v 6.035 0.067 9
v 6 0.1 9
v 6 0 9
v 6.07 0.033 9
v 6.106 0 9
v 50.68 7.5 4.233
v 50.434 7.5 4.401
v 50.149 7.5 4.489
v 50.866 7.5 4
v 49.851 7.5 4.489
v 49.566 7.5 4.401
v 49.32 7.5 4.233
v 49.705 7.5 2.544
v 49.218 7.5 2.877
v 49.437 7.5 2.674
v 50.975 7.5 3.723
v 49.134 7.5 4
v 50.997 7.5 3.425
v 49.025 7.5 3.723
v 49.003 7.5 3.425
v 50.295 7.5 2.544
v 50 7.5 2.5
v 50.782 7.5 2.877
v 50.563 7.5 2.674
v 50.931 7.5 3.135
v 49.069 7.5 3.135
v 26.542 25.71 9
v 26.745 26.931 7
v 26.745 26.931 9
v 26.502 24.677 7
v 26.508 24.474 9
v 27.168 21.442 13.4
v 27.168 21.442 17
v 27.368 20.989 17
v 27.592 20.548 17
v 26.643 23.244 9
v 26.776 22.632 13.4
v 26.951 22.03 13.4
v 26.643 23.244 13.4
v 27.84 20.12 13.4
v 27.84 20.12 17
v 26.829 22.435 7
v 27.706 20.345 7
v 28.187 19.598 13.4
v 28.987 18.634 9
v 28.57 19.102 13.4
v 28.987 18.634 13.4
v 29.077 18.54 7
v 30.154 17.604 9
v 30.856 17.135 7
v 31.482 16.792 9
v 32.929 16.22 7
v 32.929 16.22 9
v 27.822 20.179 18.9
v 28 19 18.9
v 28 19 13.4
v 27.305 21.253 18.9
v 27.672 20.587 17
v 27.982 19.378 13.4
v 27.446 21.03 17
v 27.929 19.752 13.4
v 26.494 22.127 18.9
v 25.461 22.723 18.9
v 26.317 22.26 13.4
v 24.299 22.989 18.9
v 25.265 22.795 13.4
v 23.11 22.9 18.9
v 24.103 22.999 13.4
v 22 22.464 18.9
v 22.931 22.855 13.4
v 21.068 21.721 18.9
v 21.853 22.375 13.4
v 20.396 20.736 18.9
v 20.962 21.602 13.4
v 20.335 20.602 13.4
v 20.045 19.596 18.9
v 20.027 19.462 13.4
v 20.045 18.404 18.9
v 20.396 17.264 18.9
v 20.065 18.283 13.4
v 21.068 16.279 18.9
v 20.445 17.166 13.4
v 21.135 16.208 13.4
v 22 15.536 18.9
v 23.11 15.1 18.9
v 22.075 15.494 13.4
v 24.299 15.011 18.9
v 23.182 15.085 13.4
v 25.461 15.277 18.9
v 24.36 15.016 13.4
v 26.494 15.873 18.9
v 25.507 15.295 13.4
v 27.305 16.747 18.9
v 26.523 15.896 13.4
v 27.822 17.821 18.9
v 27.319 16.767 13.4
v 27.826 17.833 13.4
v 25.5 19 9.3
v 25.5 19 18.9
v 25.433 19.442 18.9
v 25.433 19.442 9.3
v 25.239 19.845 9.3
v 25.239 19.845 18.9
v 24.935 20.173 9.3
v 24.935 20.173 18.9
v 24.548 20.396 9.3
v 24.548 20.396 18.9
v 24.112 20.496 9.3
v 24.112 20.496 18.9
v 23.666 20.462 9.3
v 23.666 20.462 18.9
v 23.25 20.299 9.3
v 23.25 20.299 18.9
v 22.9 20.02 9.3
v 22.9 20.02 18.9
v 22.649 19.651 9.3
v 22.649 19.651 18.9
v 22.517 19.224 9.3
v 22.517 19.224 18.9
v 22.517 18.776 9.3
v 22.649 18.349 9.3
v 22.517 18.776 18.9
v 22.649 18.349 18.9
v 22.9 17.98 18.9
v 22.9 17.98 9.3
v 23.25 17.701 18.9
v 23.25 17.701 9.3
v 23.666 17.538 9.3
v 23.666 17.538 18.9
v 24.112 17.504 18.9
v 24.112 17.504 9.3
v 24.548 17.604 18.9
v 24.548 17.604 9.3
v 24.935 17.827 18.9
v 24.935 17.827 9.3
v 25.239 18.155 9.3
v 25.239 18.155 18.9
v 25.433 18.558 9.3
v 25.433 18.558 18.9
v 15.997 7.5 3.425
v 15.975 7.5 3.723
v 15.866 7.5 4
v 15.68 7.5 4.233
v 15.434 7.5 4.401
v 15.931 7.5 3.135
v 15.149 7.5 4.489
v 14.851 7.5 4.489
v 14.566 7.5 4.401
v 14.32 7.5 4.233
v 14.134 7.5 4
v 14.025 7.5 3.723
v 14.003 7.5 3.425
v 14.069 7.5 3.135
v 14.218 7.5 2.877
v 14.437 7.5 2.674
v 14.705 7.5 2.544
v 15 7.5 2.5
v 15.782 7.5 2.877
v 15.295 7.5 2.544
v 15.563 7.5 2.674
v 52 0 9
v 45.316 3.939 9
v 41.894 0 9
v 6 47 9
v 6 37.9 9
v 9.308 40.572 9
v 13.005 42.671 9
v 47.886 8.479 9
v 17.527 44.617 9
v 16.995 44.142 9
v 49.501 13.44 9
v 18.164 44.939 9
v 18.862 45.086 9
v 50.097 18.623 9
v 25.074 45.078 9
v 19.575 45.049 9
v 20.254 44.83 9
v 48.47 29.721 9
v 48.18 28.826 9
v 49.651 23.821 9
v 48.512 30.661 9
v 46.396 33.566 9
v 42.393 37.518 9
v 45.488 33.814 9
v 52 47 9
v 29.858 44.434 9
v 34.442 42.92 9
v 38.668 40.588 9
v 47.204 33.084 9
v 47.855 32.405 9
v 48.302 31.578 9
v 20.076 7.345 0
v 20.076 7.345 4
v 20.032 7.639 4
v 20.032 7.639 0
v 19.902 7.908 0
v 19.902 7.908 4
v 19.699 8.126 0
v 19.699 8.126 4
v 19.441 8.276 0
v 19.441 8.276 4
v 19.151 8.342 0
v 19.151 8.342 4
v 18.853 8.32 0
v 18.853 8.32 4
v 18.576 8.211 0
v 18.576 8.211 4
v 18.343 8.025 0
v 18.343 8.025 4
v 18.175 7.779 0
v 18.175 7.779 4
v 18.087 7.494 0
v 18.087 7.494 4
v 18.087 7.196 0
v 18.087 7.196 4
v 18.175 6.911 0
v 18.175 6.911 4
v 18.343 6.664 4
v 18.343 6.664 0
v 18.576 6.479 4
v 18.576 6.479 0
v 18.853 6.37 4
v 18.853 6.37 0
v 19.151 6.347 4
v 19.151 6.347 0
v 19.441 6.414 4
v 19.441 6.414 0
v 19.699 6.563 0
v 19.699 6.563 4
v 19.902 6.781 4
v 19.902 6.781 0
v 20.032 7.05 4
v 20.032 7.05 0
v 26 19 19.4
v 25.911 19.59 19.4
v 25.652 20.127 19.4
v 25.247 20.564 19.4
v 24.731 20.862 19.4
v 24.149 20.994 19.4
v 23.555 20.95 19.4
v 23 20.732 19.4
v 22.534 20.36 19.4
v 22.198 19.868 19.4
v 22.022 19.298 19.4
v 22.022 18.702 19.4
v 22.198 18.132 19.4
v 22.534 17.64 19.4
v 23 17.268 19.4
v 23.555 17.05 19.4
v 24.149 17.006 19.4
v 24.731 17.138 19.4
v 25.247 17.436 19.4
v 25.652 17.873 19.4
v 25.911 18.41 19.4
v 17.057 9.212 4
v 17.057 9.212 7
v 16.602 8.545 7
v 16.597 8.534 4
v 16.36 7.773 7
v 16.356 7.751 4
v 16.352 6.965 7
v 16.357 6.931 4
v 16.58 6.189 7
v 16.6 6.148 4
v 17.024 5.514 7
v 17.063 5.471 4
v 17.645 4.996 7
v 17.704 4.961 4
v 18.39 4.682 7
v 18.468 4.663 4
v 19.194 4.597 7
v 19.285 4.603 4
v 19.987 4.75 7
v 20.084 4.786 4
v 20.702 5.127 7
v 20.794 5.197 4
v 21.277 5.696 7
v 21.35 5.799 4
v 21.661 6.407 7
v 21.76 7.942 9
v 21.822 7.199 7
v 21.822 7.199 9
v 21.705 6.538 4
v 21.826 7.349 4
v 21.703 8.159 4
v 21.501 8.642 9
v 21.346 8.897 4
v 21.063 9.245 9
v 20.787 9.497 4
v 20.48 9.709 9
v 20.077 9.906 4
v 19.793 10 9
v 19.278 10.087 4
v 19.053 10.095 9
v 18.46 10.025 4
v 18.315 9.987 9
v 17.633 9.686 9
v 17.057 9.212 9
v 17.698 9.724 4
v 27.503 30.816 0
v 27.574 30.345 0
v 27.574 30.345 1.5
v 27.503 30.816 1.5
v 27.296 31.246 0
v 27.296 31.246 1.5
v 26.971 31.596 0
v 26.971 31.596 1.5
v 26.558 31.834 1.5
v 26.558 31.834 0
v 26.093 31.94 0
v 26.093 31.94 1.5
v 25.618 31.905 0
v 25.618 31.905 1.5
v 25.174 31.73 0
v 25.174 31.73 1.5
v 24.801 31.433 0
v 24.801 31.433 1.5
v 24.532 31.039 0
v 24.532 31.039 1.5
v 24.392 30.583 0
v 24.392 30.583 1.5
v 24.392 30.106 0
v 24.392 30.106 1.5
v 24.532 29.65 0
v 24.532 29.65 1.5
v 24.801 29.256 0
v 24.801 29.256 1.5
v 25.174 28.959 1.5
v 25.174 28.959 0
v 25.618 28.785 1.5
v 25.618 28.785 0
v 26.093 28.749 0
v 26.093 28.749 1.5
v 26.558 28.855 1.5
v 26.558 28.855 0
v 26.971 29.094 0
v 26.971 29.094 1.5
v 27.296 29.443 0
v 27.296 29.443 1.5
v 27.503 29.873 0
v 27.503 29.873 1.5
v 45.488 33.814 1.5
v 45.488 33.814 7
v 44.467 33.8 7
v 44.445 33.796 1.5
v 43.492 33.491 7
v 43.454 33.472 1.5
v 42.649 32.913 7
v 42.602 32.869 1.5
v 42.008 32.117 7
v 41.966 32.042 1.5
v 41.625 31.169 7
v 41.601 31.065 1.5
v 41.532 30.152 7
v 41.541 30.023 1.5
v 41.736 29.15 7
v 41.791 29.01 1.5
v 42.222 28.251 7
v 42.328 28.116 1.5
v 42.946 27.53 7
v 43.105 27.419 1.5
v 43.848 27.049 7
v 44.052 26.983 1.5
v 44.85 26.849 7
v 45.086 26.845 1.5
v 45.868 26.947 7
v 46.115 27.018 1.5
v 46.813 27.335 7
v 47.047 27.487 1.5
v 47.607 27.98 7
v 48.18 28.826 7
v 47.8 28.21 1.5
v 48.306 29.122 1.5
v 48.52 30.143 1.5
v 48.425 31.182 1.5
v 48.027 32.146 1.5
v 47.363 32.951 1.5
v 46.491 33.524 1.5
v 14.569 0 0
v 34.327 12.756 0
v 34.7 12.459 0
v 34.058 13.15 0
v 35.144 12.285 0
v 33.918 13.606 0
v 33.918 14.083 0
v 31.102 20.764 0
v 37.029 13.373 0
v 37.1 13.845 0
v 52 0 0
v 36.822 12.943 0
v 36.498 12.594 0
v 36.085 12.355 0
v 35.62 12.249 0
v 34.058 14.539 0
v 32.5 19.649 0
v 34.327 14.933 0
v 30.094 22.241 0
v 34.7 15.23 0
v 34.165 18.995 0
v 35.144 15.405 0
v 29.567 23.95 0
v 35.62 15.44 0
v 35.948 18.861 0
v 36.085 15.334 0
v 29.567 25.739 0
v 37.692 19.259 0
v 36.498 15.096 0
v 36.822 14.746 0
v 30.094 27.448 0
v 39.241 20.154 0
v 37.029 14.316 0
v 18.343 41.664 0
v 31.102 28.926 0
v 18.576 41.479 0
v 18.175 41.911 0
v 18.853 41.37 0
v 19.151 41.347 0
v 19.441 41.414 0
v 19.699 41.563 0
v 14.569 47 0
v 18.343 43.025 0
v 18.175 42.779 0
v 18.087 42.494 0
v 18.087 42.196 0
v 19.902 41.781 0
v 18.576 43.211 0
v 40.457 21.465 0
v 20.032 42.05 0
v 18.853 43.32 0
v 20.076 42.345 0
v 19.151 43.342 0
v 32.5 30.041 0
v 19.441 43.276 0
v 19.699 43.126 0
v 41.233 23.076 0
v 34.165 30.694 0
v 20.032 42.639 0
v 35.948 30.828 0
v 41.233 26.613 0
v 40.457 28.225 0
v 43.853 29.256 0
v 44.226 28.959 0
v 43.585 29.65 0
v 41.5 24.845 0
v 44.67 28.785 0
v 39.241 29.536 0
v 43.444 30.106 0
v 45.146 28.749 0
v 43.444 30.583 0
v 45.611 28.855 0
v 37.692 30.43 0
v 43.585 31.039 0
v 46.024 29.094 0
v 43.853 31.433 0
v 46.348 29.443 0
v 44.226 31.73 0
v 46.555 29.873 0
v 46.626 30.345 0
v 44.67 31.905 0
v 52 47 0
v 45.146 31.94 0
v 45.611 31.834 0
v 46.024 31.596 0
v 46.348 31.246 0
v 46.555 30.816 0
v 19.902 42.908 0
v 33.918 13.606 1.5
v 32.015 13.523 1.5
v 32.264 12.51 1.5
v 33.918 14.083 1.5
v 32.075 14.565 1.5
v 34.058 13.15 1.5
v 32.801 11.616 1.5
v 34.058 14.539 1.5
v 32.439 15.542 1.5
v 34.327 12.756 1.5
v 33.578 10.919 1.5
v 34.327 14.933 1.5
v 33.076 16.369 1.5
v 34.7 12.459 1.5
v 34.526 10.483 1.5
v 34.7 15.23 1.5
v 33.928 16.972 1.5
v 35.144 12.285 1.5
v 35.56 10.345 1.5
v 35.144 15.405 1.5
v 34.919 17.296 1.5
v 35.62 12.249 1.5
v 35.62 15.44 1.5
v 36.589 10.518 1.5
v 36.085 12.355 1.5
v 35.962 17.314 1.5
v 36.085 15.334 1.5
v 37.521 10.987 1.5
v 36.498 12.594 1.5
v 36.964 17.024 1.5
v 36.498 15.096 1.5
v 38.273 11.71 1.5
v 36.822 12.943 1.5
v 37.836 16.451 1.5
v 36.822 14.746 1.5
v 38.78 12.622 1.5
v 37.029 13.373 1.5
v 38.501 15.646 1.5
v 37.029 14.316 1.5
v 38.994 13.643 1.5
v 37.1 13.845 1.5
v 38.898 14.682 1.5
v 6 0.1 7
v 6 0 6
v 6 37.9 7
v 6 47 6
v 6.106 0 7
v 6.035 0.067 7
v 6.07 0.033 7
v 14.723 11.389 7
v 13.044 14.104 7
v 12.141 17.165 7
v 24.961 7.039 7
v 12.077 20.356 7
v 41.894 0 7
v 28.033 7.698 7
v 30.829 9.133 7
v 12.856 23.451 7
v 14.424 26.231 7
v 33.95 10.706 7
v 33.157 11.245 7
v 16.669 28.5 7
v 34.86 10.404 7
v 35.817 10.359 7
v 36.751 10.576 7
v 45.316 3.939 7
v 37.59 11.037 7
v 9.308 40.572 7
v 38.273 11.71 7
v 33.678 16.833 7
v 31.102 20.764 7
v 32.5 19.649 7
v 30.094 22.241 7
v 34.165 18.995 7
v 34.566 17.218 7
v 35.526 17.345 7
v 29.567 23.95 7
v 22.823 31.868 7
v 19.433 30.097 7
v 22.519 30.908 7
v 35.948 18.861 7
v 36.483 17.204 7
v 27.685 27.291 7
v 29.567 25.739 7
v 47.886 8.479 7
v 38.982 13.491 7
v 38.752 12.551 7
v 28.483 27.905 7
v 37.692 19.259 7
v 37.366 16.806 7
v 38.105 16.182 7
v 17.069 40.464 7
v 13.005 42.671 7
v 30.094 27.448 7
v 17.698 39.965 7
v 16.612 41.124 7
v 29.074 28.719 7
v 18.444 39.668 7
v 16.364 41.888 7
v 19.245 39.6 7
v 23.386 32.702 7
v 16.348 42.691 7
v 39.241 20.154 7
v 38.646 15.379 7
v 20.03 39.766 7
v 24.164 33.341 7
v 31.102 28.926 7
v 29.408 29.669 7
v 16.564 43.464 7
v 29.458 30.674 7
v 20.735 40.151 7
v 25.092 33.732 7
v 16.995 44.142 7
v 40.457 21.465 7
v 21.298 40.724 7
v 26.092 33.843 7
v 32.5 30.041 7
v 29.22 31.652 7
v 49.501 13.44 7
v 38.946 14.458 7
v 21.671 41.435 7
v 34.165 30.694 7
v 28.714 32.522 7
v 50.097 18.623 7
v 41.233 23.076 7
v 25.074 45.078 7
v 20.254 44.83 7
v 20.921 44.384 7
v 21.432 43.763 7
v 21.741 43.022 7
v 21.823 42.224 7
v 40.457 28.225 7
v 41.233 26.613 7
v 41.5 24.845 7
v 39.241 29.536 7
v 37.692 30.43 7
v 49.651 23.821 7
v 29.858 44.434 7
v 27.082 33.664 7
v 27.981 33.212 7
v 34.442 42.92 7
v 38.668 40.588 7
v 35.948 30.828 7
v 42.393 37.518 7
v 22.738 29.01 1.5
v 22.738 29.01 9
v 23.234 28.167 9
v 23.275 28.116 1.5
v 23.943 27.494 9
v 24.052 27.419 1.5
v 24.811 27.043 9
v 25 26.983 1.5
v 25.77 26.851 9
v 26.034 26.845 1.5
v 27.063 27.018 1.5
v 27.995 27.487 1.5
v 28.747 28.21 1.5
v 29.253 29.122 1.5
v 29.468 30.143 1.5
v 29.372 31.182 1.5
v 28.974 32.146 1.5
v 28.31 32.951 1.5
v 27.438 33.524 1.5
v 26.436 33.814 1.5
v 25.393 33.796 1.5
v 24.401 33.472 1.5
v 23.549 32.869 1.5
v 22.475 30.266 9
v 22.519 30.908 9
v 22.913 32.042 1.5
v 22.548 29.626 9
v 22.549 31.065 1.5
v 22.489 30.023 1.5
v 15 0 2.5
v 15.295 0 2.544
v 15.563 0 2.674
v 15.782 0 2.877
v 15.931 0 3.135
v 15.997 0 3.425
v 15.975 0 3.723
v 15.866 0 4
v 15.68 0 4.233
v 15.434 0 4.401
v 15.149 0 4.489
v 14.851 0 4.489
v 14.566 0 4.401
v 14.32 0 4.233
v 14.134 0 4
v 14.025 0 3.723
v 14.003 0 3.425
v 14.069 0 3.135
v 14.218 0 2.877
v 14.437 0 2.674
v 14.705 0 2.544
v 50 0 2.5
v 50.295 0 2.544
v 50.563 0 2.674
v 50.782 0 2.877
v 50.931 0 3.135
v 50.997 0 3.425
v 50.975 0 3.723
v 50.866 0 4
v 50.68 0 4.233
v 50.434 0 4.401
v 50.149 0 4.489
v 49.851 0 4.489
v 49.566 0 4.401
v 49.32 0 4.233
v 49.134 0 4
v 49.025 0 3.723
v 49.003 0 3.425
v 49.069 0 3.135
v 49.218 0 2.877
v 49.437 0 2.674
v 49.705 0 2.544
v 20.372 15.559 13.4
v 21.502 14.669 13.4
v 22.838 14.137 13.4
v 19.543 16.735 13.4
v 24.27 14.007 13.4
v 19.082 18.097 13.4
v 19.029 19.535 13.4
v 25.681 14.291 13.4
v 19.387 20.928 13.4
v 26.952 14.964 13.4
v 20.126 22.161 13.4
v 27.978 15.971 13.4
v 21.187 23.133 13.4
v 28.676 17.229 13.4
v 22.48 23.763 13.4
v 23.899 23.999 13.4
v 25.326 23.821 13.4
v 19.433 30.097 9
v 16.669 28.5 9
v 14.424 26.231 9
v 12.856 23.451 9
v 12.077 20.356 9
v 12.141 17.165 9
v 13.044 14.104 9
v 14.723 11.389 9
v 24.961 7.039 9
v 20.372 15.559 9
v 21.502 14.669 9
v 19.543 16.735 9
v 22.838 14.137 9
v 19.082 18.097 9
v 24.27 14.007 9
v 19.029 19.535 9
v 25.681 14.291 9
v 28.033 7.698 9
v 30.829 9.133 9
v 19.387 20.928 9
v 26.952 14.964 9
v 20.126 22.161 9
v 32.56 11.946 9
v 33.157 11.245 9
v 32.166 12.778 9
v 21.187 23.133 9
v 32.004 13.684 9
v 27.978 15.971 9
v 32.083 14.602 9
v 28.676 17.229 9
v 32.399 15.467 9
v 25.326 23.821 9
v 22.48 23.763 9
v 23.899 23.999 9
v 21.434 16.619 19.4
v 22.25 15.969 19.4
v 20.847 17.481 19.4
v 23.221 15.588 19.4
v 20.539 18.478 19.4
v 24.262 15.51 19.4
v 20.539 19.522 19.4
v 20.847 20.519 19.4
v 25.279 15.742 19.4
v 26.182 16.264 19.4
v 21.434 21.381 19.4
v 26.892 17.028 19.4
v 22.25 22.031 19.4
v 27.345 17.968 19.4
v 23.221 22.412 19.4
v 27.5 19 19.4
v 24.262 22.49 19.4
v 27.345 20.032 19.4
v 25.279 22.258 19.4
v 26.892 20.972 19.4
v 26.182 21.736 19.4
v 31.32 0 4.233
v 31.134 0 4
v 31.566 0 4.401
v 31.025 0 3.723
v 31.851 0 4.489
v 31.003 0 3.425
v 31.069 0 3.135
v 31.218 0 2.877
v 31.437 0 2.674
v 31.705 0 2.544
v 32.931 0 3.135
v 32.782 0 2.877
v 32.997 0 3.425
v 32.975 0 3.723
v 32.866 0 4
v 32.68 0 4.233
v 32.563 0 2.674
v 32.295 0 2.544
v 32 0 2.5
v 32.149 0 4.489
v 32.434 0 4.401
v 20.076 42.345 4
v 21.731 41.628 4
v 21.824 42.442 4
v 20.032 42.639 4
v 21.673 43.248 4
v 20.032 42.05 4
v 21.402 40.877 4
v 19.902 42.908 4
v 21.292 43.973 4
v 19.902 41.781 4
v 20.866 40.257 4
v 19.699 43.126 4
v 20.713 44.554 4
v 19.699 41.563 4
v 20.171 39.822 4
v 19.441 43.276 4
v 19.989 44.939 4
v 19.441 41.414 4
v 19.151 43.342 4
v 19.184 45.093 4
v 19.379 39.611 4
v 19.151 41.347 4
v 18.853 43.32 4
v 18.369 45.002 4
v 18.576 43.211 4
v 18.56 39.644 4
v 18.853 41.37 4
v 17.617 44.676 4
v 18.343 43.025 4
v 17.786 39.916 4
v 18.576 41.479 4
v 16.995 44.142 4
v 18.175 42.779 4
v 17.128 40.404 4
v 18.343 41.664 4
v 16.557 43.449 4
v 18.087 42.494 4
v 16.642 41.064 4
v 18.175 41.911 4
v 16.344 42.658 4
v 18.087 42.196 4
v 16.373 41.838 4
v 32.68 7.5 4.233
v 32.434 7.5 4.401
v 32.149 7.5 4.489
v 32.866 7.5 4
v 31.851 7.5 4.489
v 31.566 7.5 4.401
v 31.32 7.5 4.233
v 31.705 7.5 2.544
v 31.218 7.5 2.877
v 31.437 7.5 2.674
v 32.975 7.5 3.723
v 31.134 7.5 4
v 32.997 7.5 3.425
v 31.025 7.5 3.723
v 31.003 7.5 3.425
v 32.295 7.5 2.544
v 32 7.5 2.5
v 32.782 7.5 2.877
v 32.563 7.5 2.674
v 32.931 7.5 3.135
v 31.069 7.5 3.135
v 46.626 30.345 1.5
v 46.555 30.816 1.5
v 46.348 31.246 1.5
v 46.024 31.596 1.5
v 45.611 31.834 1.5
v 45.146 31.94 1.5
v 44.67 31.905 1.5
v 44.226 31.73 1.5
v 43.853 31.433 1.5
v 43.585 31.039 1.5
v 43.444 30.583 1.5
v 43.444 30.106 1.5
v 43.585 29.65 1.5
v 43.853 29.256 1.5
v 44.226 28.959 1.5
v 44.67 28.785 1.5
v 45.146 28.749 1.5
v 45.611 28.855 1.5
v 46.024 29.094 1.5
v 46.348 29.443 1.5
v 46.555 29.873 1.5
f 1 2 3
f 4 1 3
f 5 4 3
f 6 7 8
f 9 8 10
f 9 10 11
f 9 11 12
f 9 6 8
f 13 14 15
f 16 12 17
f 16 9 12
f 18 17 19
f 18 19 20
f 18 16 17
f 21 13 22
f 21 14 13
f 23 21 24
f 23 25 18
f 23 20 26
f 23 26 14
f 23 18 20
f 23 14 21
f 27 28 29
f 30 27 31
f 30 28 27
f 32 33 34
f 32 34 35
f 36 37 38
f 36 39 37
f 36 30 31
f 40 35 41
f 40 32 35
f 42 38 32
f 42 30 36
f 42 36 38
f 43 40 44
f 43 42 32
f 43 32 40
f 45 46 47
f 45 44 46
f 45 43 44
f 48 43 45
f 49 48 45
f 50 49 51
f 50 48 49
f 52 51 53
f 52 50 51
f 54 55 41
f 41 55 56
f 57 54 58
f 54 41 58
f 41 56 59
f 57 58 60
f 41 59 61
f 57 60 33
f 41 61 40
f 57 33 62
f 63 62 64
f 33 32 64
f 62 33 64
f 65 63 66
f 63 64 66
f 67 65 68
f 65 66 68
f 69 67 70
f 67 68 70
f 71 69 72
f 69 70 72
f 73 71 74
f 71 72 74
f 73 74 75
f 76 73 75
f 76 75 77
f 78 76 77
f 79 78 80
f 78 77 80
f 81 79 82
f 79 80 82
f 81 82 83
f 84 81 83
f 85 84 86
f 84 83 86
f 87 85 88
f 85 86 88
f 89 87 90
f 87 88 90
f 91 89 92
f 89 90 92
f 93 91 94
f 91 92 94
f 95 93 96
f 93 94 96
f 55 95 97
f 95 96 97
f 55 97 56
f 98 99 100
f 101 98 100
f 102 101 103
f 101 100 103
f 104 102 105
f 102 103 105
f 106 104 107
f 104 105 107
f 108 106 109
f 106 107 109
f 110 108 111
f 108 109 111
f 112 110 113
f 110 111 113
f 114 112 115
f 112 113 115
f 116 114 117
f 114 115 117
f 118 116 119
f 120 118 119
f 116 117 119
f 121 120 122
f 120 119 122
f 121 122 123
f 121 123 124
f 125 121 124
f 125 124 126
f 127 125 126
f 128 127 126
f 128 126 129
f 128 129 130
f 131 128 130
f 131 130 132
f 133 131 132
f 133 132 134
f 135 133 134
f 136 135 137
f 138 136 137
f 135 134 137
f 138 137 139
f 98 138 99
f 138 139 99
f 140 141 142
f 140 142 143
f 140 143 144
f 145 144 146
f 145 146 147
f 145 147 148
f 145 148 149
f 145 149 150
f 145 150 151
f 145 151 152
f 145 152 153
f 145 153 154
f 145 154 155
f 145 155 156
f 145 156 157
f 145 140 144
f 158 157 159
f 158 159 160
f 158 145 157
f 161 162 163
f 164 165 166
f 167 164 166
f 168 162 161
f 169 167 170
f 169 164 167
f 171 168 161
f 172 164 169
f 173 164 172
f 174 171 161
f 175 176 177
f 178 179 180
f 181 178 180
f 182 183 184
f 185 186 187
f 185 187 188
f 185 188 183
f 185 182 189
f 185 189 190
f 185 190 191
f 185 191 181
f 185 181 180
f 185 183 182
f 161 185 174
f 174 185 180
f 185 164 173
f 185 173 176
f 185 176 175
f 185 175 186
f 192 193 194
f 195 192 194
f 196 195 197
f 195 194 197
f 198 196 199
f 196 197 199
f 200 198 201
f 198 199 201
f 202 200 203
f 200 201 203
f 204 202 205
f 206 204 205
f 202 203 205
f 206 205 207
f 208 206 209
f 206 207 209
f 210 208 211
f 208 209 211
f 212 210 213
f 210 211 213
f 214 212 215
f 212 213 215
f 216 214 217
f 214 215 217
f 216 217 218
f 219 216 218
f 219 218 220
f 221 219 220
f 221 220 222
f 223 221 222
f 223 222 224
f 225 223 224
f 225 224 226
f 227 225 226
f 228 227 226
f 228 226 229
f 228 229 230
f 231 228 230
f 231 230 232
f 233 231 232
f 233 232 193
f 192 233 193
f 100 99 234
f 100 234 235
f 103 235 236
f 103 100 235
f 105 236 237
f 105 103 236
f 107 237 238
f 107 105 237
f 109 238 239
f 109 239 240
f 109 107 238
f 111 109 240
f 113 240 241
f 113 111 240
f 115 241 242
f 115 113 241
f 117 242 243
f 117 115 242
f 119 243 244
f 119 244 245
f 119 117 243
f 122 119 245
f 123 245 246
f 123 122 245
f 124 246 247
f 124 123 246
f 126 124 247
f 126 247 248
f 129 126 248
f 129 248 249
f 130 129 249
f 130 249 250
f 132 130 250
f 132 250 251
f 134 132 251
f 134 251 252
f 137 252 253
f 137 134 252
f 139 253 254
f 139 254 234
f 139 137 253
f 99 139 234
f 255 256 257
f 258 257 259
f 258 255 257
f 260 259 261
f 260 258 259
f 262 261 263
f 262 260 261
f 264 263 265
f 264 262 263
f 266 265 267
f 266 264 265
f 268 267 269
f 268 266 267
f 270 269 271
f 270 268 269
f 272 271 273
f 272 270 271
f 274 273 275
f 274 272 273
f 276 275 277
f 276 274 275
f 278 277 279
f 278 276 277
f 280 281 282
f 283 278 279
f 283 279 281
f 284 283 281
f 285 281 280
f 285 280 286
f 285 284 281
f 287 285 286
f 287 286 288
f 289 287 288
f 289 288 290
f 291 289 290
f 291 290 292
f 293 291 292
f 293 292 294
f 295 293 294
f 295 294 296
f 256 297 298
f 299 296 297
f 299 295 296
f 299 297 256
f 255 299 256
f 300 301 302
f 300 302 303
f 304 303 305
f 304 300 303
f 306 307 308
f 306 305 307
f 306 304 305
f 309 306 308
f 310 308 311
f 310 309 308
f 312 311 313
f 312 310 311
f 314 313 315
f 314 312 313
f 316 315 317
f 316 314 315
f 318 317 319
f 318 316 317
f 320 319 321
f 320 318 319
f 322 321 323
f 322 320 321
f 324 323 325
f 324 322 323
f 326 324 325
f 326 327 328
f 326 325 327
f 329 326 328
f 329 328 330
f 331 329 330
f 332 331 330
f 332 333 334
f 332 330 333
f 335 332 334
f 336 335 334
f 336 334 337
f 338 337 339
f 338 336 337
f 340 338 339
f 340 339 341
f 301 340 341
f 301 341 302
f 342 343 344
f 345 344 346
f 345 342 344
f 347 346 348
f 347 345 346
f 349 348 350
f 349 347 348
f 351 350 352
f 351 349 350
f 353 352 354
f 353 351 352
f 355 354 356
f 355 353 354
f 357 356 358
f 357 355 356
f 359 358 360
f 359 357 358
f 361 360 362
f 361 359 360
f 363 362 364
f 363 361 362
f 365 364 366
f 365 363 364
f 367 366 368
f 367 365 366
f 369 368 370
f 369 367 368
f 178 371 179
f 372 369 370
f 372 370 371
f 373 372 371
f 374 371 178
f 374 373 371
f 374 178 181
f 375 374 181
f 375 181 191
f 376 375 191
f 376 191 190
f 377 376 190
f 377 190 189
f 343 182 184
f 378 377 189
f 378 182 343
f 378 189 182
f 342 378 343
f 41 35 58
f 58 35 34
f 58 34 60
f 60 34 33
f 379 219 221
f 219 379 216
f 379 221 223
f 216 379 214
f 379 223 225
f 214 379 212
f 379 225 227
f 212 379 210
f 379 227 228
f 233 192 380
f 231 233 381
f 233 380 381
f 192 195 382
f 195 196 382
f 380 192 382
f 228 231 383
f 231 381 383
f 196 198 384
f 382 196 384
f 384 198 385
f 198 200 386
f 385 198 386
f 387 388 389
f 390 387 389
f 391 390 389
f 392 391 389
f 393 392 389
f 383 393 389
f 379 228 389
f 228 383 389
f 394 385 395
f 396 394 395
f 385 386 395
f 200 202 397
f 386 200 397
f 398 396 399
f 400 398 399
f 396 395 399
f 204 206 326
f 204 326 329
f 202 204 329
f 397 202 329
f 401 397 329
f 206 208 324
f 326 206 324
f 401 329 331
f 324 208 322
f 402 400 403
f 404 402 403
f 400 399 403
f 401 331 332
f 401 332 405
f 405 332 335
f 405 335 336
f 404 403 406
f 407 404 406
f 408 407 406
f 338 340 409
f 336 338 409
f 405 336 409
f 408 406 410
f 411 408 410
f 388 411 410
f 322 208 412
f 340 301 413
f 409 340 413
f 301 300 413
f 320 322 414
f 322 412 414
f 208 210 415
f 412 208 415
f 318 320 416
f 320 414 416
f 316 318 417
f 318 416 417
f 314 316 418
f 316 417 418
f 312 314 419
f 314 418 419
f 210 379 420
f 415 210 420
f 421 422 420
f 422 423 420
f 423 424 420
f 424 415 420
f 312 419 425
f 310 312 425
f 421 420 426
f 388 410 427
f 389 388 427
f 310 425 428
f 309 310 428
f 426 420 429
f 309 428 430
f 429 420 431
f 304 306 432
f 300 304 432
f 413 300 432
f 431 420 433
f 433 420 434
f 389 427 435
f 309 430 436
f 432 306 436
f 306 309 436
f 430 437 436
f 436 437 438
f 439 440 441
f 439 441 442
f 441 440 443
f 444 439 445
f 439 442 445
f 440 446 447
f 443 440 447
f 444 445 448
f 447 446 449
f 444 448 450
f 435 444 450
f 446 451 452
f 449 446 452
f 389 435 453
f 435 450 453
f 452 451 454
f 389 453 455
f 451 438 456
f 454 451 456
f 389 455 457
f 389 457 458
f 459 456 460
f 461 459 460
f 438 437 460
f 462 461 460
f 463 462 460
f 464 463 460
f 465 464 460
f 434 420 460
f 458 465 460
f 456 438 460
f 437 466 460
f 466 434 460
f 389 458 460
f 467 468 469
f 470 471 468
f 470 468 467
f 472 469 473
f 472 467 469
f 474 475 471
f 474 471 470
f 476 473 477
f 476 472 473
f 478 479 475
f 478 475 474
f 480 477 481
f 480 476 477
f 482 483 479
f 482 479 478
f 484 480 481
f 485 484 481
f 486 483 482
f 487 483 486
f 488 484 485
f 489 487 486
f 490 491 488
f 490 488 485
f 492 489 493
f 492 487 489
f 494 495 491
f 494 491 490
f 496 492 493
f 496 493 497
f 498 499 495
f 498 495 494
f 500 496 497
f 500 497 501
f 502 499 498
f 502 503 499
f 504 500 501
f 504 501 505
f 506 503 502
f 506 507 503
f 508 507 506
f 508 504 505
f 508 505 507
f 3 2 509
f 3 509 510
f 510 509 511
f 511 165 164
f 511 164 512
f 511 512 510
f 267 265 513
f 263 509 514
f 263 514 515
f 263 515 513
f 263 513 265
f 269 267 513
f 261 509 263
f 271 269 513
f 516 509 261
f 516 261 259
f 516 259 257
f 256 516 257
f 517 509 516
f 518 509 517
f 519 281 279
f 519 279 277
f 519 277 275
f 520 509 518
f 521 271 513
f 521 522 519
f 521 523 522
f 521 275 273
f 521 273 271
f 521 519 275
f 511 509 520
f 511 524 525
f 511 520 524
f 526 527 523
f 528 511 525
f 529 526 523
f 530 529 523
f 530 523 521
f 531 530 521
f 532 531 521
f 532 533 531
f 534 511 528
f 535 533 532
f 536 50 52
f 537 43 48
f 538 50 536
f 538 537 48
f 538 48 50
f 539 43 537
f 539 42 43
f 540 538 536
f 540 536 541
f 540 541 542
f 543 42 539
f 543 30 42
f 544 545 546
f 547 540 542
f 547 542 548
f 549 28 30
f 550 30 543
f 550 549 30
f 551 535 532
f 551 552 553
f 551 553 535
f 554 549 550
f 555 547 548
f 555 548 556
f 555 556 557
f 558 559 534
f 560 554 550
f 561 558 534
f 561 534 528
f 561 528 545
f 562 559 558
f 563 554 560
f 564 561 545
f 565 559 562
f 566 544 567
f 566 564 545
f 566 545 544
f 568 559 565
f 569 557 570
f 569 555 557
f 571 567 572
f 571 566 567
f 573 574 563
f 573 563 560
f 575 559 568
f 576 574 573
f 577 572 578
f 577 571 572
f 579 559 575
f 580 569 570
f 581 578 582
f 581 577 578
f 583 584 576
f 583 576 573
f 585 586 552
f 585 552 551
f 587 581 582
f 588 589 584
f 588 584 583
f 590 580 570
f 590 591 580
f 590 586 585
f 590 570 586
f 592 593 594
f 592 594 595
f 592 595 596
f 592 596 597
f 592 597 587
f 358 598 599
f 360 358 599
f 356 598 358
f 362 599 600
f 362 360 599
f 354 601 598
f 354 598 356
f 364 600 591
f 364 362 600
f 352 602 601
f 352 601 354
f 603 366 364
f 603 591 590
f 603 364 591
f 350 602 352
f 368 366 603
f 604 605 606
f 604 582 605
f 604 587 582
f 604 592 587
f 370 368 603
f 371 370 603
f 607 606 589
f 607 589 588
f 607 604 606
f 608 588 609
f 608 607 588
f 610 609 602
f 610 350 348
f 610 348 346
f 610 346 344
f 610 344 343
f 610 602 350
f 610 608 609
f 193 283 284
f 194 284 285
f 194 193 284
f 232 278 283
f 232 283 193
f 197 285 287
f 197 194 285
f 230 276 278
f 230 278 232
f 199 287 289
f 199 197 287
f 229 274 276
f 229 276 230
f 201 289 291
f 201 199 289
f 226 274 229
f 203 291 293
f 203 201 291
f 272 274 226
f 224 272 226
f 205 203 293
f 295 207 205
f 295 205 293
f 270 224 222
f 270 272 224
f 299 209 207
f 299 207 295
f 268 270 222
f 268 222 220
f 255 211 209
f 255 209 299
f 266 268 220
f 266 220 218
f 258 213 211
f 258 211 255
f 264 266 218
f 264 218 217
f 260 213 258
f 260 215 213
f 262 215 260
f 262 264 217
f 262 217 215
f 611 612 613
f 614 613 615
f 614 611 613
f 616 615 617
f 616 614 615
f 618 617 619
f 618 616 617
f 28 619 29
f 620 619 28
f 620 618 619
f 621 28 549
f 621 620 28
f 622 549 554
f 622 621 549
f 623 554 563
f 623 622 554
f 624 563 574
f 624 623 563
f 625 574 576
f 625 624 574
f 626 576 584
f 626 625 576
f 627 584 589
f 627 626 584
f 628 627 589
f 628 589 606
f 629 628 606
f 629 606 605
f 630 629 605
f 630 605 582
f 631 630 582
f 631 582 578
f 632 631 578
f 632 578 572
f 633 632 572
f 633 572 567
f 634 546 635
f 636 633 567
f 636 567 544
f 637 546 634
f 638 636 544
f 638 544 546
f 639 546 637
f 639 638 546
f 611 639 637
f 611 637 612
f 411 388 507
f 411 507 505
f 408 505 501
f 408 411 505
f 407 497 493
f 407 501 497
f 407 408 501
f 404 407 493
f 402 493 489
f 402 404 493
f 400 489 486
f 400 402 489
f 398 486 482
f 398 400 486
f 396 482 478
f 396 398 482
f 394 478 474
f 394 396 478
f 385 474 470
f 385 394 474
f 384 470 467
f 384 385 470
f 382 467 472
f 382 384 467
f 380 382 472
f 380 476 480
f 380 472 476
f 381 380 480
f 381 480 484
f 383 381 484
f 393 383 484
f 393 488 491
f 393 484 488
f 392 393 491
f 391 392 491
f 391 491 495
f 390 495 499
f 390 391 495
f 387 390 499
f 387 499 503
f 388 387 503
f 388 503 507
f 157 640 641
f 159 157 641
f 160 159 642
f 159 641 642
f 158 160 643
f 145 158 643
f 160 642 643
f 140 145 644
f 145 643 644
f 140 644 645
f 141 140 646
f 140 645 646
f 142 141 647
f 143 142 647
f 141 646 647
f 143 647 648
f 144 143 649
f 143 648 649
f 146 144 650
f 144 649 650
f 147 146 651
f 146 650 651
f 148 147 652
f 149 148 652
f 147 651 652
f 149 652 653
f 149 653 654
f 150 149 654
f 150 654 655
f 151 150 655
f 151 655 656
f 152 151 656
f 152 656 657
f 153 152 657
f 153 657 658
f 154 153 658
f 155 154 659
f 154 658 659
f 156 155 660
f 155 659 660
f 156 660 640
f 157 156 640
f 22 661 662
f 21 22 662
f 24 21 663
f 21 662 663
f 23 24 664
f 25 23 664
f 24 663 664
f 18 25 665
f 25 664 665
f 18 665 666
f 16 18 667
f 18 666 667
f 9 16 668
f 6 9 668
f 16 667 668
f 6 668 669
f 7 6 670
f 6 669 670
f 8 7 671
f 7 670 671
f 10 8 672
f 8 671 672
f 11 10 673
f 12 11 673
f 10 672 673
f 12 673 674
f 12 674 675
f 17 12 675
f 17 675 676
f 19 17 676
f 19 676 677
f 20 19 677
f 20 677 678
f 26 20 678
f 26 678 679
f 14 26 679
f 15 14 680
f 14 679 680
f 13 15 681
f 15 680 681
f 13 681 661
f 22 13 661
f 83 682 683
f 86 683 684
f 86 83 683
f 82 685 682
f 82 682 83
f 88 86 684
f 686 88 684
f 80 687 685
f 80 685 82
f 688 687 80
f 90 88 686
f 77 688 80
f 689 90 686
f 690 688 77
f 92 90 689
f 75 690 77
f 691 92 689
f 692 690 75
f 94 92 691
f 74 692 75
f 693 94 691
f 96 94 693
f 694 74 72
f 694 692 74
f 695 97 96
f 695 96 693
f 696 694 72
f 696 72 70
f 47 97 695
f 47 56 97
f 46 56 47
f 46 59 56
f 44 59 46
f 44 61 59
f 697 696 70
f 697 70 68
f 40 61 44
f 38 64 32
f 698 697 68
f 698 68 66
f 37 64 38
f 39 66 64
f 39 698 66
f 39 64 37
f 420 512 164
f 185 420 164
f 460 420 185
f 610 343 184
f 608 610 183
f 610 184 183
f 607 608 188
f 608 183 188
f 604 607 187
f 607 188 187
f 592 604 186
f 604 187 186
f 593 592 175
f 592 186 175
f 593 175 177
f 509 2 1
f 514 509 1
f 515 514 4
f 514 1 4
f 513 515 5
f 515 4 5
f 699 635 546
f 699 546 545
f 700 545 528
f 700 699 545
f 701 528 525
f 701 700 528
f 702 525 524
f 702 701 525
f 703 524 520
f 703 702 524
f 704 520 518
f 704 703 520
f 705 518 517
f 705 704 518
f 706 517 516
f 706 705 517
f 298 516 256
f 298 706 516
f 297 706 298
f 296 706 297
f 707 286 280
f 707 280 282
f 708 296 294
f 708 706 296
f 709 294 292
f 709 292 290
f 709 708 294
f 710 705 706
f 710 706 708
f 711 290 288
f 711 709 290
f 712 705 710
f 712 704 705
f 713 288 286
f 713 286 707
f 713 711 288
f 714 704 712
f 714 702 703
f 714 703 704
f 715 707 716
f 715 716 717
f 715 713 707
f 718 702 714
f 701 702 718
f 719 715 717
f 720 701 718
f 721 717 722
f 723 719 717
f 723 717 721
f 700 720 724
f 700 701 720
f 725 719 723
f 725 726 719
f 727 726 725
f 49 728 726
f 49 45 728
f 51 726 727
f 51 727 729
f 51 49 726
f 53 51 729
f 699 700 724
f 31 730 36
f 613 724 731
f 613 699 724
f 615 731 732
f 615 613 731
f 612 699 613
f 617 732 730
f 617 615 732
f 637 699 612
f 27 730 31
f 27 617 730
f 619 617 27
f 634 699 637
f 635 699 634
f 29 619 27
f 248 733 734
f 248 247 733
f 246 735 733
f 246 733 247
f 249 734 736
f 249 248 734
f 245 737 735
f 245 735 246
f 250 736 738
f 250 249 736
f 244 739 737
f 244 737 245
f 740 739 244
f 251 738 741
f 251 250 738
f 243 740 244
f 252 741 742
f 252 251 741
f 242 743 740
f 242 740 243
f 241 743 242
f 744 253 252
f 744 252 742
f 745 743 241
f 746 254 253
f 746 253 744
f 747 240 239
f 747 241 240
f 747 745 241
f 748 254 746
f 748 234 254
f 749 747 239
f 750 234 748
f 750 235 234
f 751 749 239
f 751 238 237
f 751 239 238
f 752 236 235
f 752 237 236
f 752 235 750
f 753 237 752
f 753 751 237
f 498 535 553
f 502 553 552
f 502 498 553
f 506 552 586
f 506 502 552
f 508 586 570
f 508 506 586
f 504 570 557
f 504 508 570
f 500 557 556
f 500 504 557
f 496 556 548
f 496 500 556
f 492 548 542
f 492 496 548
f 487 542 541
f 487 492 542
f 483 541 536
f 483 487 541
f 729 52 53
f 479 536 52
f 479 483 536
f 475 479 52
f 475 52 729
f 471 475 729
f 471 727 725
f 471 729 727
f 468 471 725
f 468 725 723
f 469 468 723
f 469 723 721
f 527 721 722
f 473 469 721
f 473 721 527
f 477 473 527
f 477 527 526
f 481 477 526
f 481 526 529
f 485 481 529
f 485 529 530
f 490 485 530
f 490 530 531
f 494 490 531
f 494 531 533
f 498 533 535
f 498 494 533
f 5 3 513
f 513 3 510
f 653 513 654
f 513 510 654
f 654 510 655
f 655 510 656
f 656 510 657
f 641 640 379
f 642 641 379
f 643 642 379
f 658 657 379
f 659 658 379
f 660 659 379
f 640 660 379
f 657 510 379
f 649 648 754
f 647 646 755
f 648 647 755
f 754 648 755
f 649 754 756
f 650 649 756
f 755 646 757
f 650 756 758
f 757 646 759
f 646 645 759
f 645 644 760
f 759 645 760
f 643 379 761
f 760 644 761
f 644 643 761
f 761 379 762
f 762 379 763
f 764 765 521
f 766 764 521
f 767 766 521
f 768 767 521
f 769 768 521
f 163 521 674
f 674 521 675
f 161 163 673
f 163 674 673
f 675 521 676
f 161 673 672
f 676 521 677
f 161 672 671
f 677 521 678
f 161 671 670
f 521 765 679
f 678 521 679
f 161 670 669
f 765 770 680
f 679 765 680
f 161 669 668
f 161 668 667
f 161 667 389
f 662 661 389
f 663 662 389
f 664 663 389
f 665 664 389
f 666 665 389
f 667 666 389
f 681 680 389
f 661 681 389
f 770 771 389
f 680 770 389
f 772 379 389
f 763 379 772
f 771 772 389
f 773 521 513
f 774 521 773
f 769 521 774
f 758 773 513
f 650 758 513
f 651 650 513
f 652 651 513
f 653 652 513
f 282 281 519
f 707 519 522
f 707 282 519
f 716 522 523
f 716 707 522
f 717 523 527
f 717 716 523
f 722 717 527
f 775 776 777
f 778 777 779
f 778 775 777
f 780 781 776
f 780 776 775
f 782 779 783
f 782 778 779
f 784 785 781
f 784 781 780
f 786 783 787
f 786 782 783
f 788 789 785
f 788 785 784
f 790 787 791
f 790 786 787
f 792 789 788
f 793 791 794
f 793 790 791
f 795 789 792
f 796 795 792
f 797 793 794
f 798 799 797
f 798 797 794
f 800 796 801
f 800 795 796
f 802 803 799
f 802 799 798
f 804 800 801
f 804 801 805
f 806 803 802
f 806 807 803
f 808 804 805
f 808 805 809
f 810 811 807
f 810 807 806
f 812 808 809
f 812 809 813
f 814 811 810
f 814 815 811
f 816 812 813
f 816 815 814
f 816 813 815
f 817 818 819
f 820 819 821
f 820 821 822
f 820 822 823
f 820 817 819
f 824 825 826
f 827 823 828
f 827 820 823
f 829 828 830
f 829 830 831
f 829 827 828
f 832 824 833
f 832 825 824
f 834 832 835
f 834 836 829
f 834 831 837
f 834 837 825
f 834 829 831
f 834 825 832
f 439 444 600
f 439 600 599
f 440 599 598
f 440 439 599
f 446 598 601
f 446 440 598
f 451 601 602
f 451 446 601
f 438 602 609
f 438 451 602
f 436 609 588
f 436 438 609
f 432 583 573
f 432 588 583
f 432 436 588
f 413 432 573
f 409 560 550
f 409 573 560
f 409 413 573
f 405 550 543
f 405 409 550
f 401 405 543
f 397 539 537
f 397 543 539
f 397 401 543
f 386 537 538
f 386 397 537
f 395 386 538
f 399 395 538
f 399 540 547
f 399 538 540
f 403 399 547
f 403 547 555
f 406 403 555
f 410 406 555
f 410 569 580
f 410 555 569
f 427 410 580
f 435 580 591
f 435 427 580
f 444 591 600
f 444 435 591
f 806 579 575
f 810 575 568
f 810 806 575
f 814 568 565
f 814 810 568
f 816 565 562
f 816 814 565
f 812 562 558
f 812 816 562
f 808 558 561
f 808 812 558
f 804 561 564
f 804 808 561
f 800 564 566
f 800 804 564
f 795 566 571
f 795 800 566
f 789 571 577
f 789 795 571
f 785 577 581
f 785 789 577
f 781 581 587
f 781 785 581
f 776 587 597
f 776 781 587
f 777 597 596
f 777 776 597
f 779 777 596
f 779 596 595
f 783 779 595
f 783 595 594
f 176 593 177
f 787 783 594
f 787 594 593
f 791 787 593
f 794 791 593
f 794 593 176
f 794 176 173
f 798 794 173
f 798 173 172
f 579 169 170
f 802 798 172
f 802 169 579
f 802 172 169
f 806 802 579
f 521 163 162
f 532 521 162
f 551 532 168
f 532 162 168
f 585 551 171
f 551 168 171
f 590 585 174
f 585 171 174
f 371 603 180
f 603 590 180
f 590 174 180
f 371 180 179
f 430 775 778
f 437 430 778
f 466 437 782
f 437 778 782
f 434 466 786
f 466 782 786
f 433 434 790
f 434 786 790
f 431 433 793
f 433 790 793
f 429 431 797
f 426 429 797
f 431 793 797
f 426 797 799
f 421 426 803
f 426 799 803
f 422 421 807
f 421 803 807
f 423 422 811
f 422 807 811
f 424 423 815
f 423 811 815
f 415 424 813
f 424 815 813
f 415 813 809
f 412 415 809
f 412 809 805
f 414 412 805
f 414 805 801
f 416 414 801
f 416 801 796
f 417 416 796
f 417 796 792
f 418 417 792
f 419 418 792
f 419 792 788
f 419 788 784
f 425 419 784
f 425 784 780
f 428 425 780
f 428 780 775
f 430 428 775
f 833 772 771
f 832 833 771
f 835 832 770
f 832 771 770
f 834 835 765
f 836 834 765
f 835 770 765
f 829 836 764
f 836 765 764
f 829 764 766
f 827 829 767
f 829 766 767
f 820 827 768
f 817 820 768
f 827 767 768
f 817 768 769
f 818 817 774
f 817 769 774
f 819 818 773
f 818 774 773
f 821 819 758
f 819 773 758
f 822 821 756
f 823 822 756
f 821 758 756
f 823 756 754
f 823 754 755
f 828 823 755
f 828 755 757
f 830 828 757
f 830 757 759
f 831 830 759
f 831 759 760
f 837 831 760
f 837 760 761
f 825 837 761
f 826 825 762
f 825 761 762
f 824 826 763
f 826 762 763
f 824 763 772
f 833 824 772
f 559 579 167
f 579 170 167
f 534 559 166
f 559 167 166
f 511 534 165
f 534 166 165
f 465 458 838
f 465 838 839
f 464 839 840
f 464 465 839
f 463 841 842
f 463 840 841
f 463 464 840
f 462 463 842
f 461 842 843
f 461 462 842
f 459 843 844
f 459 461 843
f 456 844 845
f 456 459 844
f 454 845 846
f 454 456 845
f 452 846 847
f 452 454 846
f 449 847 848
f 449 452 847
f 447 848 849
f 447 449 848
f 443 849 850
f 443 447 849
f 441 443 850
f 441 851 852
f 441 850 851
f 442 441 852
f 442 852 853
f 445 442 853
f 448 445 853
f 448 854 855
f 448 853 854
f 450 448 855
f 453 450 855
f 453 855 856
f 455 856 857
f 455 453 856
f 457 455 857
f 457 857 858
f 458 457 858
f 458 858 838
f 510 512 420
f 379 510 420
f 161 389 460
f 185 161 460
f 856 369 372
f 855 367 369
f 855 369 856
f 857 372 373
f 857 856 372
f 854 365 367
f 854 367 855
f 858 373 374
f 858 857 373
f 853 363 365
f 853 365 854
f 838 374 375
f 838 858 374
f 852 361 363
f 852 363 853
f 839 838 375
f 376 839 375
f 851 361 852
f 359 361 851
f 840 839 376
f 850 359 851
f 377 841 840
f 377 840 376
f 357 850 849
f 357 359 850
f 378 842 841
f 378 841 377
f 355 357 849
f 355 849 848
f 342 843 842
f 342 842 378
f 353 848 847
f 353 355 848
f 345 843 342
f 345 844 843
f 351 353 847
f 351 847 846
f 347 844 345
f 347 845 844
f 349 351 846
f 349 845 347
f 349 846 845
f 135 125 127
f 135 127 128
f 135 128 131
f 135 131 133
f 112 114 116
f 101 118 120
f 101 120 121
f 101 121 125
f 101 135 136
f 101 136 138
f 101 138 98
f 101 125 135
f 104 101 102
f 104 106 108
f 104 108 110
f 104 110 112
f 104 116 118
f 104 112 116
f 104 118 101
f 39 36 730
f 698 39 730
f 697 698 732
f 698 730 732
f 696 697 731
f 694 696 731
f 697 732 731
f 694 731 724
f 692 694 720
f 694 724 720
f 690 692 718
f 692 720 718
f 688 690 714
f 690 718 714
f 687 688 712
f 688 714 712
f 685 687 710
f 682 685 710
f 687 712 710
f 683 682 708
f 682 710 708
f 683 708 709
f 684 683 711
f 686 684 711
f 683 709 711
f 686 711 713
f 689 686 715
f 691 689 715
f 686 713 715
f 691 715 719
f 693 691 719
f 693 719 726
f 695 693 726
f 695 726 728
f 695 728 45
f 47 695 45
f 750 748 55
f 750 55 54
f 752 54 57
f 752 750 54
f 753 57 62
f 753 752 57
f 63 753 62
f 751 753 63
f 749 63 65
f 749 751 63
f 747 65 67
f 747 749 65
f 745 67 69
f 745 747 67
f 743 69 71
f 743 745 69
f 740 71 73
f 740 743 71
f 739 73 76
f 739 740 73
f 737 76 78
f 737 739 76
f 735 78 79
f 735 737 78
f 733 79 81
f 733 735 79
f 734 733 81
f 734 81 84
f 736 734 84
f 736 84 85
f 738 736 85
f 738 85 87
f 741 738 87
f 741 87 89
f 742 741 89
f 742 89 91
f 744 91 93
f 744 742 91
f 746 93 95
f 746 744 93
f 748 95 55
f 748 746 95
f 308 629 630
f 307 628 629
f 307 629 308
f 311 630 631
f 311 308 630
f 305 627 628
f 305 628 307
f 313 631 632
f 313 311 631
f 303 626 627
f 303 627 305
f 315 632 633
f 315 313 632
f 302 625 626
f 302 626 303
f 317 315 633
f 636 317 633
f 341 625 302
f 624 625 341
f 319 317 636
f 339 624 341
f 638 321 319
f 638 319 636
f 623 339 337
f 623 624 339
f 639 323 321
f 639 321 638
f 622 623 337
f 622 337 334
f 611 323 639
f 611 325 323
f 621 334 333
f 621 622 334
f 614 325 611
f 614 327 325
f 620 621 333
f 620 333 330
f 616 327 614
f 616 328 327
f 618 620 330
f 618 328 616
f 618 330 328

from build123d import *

# Parameters (mm, degrees)
SKETCH_1_W                  = 52
SKETCH_1_H                  = 47
EXTRUDE_336_DEPTH           = 9
SKETCH_2_R                  = 26.1
SKETCH_2_R_2                = 12
CUT_EXTRUDE_544_DEPTH       = 2
SKETCH_3_R                  = 5
EXTRUDE_1_DEPTH             = 4.4
SKETCH_4_R                  = 4
EXTRUDE_2_DEPTH             = 6
SKETCH_5_R                  = 1.5
CUT_EXTRUDE_852_DEPTH       = 10.1
CHAMFER_1_SIZE              = 0.5
CUT_EXTRUDE_1174_DEPTH      = 72.181177287
CUT_EXTRUDE_1174_DEPTH_BACK = 72.181177287
SKETCH_6_R                  = 6
CUT_EXTRUDE_1461_DEPTH      = 72.181177287
CUT_EXTRUDE_1461_DEPTH_BACK = 72.181177287
SKETCH_7_R                  = 1.6
CUT_EXTRUDE_START           = -5.5
SKETCH_8_R                  = 3.5
CUT_EXTRUDE_1708_DEPTH      = 77.681177287
PATTERN_CIRCULAR_1_COUNT    = 3
SKETCH_9_R                  = 1
CUT_EXTRUDE_2077_DEPTH      = 72.181177287
CUT_EXTRUDE_2390_DEPTH      = 72.181177287
CUT_EXTRUDE_2390_DEPTH_BACK = 3
SKETCH_10_R                 = 2.75
SKETCH_11_R                 = 1
CUT_EXTRUDE_9_DEPTH         = 7.5
CUT_EXTRUDE_1_DEPTH         = 73.72798636
CUT_EXTRUDE_2_DEPTH         = 73.72798636
SKETCH_14_R                 = 9
CUT_EXTRUDE_10_DEPTH        = 10


with BuildPart() as part:
    # 草图1 → Extrude 336 (new body)
    with BuildSketch(Plane.XY):
        with Locations((26, 23.5)):
            Rectangle(SKETCH_1_W, SKETCH_1_H)
    extrude(amount=EXTRUDE_336_DEPTH)

    # 草图2 → Cut-Extrude 544 (cut)
    with BuildSketch(Plane.XY.offset(9)):
        with Locations((24, 19)):
            Circle(SKETCH_2_R)
        with Locations((24, 19)):
            Circle(SKETCH_2_R_2, mode=Mode.SUBTRACT)
    extrude(amount=-CUT_EXTRUDE_544_DEPTH, mode=Mode.SUBTRACT)

    # 草图3 → 轮子连接1 (add)
    with BuildSketch(Plane.XY.offset(9)):
        with Locations((24, 19)):
            Circle(SKETCH_3_R)
    extrude(amount=EXTRUDE_1_DEPTH)

    # 草图4 → 轮子连接2 (add)
    with BuildSketch(Plane.XY.offset(13.4)):
        with Locations((24, 19)):
            Circle(SKETCH_4_R)
    extrude(amount=EXTRUDE_2_DEPTH)

    # 草图5 → Cut-Extrude 852 (cut)
    with BuildSketch(Plane.XY.offset(19.4)):
        with Locations((24, 19)):
            Circle(SKETCH_5_R)
    extrude(amount=-CUT_EXTRUDE_852_DEPTH, mode=Mode.SUBTRACT)

    # 倒角1
    chamfer_1_edges = [part.edges().sort_by_distance(p)[0] for p in [
        (20, 19, 19.4),
        (22.5, 19, 19.4),
    ]]
    chamfer(chamfer_1_edges, length=CHAMFER_1_SIZE)

    # 草图6 → Cut-Extrude 1174 (cut, two sides: drawn at the far end of the back side and taken through both)
    with BuildSketch(Plane.XY.offset(7).offset(-CUT_EXTRUDE_1174_DEPTH_BACK)):
        with Locations((35.5, 24.844655678)):
            Circle(SKETCH_6_R)
    extrude(amount=CUT_EXTRUDE_1174_DEPTH + CUT_EXTRUDE_1174_DEPTH_BACK, mode=Mode.SUBTRACT)

    # 草图7 → Cut-Extrude 1461 (cut, two sides: drawn at the far end of the back side and taken through both)
    with BuildSketch(Plane.XY.offset(7).offset(-CUT_EXTRUDE_1461_DEPTH_BACK)):
        with Locations((25.973720558, 30.344655678)):
            Circle(SKETCH_7_R)
        with Locations((45.026279442, 30.344655678)):
            Circle(SKETCH_7_R)
        with Locations((35.5, 13.844655678)):
            Circle(SKETCH_7_R)
    extrude(amount=CUT_EXTRUDE_1461_DEPTH + CUT_EXTRUDE_1461_DEPTH_BACK, mode=Mode.SUBTRACT)

    # 草图8 → Cut-Extrude 1708 (cut)
    with BuildSketch(Plane.XY.offset(7).offset(CUT_EXTRUDE_START)):
        with Locations(Location((45.026279442, 30.344655678, 0), (0, 0, 82.411277971))):
            Circle(SKETCH_8_R)
    cut_extrude_1708 = extrude(amount=CUT_EXTRUDE_1708_DEPTH, mode=Mode.SUBTRACT)

    # 阵列(圆周)1: Cut-Extrude 1708 ×3 about axis
    pattern_circular_1_axis = Axis((35.5, 24.844655678, 0), (0, 0, 1))
    for i in range(1, PATTERN_CIRCULAR_1_COUNT):
        add(cut_extrude_1708.rotate(pattern_circular_1_axis, i * 360 / PATTERN_CIRCULAR_1_COUNT), mode=Mode.SUBTRACT)

    # 草图9 → Cut-Extrude 2077 (cut, through all)
    with BuildSketch(Plane.XY.offset(7)):
        with Locations((19.075932294, 42.344655678)):
            Circle(SKETCH_9_R)
        with Locations((19.075932294, 7.344655678)):
            Circle(SKETCH_9_R)
    extrude(amount=-CUT_EXTRUDE_2077_DEPTH, mode=Mode.SUBTRACT)

    # 草图10 → Cut-Extrude 2390 (cut, two sides: drawn at the far end of the back side and taken through both)
    with BuildSketch(Plane.XY.offset(7).offset(-CUT_EXTRUDE_2390_DEPTH_BACK)):
        with Locations(Location((19.075932294, 42.344655678, 0), (0, 0, 139.177975249))):
            Circle(SKETCH_10_R)
        with Locations(Location((19.075932294, 7.344655678, 0), (0, 0, 137.224544141))):
            Circle(SKETCH_10_R)
    extrude(amount=CUT_EXTRUDE_2390_DEPTH + CUT_EXTRUDE_2390_DEPTH_BACK, mode=Mode.SUBTRACT)

    # 草图11 → 切除-拉伸9 (cut)
    with BuildSketch(Plane.XZ):
        with Locations(Location((15, 3.5, 0), (0, 0, 270))):
            Circle(SKETCH_11_R)
        with Locations(Location((50, 3.5, 0), (0, 0, 270))):
            Circle(SKETCH_11_R)
        with Locations(Location((32, 3.5, 0), (0, 0, 270))):
            Circle(SKETCH_11_R)
    extrude(amount=-CUT_EXTRUDE_9_DEPTH, mode=Mode.SUBTRACT)

    # 草图12 → 修改外形1 (cut, through all)
    with BuildSketch(Plane.XZ):
        Polygon((0, 8), (11.425184054, 0), (0, 0), align=None)
    extrude(amount=-CUT_EXTRUDE_1_DEPTH, mode=Mode.SUBTRACT)

    # 草图13 → 修改外形2 (cut, through all)
    with BuildSketch(Plane(origin=(0, 47, 0), x_dir=(1, 0, 0), z_dir=(0, 1, 0))):
        Polygon((0, -9), (6, -9), (6, -6), (14.56888804, 0), (11.425184054, 0), (0, -8), align=None)
    extrude(amount=-CUT_EXTRUDE_2_DEPTH, mode=Mode.SUBTRACT)

    # 草图14 → 切除-拉伸10 (cut)
    with BuildSketch(Plane.XY.offset(7)):
        with Locations((35.5, 24.844655678)):
            Circle(SKETCH_14_R)
    extrude(amount=CUT_EXTRUDE_10_DEPTH, mode=Mode.SUBTRACT)


solid = part.part
